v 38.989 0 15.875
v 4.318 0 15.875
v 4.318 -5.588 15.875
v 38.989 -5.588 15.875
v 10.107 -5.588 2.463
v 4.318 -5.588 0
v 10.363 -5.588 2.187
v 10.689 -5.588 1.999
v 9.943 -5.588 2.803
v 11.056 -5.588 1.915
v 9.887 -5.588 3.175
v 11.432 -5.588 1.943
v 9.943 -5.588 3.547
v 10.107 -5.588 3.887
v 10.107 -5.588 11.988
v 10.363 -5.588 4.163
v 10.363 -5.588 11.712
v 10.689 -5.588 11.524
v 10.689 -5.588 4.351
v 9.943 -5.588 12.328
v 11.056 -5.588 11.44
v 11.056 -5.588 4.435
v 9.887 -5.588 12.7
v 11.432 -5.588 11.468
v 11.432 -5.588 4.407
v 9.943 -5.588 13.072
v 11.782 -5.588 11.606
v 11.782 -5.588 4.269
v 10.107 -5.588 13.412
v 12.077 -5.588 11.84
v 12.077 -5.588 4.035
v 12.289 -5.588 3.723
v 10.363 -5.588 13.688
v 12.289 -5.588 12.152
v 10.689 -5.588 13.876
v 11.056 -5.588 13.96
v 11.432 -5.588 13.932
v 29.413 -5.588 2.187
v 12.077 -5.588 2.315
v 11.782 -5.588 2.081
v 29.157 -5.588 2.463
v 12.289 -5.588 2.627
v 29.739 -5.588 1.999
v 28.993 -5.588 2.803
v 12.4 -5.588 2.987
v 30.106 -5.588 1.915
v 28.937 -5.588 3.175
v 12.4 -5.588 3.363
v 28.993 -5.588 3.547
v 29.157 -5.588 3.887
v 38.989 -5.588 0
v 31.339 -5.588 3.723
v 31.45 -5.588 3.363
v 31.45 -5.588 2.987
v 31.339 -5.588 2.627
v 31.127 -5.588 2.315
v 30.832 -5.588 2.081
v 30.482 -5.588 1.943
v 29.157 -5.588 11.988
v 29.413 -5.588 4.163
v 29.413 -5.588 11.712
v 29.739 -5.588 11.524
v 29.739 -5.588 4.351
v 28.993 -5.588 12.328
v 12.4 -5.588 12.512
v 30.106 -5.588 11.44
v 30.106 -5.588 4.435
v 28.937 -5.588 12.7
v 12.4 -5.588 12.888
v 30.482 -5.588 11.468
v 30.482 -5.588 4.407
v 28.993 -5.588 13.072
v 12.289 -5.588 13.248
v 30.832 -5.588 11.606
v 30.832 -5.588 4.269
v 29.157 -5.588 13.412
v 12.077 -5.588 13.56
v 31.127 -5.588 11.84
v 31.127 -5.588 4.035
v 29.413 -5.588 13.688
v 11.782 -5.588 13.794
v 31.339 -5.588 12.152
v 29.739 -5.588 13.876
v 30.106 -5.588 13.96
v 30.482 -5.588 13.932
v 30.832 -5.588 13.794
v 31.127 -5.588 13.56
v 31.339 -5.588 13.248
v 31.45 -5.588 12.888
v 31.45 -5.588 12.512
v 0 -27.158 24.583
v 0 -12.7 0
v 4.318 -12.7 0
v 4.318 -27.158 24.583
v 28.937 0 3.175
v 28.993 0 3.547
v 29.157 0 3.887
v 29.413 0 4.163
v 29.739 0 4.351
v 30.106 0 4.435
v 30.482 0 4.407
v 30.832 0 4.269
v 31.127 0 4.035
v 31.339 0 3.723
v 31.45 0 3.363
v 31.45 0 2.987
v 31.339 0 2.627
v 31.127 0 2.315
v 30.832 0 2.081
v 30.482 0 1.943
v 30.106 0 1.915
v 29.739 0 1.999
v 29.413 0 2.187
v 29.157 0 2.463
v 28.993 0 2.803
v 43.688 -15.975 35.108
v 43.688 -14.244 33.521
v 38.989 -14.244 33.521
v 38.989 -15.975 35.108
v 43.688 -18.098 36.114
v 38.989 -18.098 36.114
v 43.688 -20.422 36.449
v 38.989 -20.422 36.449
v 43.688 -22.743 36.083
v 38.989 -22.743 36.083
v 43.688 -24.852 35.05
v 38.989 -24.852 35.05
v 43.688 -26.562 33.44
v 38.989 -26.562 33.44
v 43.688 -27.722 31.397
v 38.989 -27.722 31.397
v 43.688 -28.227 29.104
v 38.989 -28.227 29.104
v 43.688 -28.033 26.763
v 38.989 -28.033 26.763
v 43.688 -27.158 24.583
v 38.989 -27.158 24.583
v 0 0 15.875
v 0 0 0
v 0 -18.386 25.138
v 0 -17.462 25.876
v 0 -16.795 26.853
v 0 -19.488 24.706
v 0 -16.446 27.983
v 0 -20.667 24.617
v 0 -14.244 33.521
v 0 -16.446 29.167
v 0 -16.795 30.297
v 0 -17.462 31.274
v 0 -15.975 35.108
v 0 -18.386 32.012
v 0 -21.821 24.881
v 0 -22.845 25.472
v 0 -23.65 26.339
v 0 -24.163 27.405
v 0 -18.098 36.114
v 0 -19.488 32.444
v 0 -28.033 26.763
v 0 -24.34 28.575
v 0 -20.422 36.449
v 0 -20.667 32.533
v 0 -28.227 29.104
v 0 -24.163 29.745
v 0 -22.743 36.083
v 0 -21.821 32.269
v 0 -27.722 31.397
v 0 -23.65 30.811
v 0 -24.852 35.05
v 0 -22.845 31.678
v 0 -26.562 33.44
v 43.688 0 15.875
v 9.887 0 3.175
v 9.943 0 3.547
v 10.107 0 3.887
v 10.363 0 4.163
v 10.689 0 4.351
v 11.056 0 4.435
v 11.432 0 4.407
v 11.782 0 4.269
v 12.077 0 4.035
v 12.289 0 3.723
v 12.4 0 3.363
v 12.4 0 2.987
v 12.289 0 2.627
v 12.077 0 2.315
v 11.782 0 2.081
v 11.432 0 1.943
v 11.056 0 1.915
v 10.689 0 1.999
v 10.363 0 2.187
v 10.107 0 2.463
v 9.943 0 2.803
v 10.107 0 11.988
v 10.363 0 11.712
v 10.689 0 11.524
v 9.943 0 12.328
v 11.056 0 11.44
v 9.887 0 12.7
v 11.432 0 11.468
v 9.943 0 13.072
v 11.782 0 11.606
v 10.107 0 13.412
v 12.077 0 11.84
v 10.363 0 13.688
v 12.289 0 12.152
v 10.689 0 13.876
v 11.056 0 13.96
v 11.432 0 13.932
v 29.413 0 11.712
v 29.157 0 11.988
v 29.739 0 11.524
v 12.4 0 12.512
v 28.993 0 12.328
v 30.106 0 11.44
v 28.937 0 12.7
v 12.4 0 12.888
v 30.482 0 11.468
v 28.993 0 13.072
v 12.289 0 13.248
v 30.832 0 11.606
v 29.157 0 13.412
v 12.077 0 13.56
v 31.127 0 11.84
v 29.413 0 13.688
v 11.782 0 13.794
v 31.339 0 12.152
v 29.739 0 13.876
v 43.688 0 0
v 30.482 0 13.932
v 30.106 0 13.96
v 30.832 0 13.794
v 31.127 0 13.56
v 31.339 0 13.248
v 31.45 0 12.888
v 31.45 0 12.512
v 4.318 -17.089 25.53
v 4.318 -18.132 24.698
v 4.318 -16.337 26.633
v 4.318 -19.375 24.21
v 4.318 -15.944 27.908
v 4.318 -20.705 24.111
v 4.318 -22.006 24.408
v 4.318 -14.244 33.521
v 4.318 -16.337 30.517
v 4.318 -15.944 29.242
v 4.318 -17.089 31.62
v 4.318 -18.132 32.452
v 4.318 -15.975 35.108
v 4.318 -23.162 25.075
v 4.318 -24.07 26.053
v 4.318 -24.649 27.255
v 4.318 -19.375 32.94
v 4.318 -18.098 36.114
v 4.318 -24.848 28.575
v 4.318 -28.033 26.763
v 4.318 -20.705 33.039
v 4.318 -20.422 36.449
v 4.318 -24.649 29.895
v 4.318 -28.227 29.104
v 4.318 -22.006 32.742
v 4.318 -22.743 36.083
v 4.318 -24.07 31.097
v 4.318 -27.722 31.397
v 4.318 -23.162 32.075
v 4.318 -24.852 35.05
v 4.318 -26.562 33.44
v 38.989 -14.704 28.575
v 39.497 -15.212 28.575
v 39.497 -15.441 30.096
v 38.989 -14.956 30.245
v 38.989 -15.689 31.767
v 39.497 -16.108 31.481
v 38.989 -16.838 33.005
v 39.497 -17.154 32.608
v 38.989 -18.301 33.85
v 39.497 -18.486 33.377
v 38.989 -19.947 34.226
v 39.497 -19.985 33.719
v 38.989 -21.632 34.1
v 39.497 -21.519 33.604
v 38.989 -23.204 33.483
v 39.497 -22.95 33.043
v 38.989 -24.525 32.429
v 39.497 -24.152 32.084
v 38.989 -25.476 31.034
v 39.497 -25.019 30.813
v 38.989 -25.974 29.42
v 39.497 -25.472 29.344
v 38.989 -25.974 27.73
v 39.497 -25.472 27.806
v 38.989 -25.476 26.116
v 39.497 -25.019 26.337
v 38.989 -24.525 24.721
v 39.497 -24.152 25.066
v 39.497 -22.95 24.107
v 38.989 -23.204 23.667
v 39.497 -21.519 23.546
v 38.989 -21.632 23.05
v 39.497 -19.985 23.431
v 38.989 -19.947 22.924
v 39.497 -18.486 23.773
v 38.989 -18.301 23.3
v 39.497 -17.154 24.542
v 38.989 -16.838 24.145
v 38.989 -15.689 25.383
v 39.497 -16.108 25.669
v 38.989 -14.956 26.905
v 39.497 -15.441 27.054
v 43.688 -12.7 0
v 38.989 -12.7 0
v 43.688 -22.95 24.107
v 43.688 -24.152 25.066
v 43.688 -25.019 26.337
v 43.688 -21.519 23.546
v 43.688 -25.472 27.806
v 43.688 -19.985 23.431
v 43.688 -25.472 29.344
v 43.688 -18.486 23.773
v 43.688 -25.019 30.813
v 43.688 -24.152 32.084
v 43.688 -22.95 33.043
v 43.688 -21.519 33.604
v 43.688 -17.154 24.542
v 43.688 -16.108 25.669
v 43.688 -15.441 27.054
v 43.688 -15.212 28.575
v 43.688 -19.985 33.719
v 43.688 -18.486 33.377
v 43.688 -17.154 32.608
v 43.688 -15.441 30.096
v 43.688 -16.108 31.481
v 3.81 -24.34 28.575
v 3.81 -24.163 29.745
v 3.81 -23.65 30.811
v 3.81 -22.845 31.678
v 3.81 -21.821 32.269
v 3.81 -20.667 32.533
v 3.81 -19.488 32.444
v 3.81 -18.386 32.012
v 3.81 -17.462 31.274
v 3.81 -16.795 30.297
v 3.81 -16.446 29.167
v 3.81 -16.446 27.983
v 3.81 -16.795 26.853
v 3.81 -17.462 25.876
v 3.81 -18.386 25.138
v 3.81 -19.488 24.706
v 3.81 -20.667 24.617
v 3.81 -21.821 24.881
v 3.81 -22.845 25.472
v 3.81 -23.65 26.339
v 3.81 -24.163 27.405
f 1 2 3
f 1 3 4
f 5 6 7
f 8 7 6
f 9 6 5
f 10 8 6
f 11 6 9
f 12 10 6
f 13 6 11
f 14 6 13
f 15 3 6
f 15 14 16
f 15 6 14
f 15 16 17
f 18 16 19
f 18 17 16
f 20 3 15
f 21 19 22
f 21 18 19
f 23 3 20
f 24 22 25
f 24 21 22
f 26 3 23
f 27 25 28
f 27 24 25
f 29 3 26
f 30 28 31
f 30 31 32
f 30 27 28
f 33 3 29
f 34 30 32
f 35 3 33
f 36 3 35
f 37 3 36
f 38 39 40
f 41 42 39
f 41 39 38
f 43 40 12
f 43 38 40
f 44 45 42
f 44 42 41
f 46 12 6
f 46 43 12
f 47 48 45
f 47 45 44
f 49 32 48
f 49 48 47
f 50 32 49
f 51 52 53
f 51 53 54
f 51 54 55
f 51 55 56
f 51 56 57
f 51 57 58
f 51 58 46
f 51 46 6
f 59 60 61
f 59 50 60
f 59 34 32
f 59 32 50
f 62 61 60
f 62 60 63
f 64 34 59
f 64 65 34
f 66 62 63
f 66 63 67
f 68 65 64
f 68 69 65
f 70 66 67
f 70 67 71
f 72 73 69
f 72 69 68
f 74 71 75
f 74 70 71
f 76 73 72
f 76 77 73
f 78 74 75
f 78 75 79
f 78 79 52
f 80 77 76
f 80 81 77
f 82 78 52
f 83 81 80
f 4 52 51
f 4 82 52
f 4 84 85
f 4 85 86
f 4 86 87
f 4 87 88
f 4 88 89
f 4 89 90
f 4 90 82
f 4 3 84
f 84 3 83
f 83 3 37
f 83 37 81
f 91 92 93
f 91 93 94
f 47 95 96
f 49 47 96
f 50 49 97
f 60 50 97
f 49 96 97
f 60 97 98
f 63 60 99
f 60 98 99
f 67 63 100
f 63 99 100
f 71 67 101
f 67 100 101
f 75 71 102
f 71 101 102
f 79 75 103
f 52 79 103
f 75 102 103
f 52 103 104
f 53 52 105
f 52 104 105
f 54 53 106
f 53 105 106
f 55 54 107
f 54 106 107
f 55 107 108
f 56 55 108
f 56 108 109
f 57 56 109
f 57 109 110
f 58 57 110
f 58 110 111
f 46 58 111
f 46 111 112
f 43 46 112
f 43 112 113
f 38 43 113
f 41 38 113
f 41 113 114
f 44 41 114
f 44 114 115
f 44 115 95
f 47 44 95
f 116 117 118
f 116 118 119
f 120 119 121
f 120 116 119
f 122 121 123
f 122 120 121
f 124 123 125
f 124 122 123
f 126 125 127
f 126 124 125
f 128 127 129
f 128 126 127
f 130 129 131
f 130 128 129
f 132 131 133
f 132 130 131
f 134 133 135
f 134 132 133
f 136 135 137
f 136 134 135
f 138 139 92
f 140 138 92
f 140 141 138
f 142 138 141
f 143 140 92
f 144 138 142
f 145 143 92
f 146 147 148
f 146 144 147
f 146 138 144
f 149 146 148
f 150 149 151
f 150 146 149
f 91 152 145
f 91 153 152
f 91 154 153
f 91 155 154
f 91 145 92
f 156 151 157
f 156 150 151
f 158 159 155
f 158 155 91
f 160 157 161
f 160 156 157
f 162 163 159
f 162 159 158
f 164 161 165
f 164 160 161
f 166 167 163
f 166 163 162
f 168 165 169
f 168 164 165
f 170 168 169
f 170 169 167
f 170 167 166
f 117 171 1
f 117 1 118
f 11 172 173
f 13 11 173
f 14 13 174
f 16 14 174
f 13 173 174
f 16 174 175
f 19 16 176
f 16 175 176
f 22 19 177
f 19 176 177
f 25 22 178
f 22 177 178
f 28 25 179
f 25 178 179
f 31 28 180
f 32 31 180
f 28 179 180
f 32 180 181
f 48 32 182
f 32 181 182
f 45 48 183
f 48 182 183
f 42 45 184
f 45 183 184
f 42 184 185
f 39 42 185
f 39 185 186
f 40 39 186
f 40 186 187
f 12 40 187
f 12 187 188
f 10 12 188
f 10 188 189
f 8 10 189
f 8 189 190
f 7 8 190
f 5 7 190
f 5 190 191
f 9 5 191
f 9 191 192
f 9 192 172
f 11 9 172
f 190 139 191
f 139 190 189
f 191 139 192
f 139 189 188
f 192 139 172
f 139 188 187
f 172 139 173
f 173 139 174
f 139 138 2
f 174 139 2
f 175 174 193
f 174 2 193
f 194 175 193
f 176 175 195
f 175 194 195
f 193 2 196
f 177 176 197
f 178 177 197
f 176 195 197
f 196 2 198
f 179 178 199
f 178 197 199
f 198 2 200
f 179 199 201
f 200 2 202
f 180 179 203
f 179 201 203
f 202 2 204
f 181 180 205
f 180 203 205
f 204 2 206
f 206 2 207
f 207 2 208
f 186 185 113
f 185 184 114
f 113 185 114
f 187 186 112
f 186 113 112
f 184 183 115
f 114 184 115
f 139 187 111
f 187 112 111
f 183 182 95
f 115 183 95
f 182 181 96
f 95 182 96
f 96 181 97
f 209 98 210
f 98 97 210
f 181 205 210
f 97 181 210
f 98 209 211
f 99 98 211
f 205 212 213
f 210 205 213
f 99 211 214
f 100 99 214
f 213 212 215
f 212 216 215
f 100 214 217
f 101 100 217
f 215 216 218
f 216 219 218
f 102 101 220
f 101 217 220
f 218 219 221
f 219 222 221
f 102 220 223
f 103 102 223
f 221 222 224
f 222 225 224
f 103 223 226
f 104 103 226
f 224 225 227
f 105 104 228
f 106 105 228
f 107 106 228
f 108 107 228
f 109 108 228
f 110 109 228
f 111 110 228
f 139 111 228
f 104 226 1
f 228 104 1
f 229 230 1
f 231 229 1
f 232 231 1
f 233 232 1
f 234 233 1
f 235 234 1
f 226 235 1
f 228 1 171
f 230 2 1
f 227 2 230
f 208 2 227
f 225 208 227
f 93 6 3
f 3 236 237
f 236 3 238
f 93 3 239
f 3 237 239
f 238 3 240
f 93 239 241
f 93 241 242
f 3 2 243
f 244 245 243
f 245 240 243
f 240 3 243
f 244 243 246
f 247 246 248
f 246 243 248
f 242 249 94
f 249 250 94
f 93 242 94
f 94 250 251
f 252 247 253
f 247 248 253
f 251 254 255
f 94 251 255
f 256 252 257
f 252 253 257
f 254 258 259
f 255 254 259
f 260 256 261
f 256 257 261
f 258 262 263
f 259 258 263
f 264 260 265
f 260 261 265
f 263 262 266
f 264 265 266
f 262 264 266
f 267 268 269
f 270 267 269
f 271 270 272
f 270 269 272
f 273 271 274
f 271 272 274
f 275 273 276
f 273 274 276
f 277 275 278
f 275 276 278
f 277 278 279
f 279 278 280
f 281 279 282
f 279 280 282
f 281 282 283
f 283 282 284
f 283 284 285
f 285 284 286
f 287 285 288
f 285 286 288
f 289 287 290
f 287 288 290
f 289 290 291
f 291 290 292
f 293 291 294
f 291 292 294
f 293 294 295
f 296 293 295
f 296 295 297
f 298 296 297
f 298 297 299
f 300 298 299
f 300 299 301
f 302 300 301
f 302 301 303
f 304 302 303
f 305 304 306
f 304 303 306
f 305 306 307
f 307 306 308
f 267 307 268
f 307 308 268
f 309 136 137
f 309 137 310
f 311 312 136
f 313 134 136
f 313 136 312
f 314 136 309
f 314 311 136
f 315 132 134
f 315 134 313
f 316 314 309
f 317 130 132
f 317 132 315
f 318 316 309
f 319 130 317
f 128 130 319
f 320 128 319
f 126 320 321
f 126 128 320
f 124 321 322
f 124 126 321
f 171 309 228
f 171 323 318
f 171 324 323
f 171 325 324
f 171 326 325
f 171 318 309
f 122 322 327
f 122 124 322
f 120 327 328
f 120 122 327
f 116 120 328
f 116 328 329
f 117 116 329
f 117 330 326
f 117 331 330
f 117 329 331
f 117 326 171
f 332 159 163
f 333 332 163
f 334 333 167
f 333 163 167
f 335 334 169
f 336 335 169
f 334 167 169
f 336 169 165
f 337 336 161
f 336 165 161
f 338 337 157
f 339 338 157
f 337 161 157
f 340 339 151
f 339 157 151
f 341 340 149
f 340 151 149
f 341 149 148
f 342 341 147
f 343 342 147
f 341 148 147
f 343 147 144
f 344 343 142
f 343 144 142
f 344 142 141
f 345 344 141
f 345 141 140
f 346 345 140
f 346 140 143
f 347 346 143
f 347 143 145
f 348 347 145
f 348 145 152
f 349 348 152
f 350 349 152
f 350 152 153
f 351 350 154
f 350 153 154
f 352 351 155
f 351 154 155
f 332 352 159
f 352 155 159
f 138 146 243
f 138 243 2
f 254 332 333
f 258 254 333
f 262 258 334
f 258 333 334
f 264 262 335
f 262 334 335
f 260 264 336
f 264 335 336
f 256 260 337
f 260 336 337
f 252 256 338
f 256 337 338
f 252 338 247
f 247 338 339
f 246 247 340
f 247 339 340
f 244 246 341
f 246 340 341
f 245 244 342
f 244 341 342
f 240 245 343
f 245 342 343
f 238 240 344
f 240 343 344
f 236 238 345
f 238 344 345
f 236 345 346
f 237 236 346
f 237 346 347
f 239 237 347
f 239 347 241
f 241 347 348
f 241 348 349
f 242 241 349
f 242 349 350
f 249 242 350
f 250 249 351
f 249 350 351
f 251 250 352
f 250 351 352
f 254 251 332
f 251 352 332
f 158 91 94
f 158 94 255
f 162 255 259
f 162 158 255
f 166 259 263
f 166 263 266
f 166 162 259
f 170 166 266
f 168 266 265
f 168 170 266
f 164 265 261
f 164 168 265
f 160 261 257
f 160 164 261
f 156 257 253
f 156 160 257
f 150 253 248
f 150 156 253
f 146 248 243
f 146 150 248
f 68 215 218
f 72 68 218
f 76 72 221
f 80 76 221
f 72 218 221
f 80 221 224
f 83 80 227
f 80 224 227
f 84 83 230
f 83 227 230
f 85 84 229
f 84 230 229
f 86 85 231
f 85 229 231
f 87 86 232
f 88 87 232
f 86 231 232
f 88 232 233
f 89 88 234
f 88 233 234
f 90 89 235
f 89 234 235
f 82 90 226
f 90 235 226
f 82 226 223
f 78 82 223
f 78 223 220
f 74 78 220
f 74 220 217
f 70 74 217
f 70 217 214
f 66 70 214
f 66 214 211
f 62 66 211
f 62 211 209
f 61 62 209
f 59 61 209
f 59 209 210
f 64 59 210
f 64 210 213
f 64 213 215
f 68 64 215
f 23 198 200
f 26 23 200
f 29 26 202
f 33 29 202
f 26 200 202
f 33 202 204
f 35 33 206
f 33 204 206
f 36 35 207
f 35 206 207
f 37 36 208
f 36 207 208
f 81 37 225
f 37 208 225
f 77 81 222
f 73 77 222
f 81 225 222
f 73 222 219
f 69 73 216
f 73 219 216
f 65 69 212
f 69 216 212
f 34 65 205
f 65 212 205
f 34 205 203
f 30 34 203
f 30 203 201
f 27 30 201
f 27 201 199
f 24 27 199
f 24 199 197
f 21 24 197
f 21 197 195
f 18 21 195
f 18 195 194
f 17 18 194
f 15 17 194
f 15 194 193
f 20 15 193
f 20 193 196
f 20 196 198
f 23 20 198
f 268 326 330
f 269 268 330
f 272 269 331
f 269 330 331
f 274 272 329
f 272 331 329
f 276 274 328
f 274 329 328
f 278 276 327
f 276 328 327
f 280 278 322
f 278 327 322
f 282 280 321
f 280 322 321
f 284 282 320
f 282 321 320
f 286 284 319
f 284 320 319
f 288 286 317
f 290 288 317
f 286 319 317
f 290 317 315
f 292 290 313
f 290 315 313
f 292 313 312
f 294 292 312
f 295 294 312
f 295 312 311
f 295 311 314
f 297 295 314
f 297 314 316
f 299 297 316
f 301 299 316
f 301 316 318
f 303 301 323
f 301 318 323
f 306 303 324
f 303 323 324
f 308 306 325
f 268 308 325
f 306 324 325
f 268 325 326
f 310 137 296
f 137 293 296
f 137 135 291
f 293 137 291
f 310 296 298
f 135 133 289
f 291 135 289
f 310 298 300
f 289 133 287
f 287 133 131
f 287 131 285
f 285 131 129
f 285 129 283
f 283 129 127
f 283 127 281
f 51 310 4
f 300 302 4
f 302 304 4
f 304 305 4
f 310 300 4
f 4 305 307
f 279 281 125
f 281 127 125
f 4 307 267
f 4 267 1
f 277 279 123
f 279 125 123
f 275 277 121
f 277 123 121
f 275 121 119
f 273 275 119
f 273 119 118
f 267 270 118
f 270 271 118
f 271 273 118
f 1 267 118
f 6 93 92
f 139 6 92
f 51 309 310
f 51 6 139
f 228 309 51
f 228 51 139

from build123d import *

# Parameters (mm, degrees)
F0_W     = 43.688
F0_H     = 15.875
F1_DEPTH = 5.588
F2_R     = 5.15874
F3_DEPTH = 4.699
F4_R     = 3.96875
F4_W     = 5.588
F4_H     = 15.875
F5_DEPTH = 4.318
F7_D     = 2.5273
F8_SIZE  = 0.508


with BuildPart() as f1:
    # F0 (on Front) → F1 (new body)
    with BuildSketch(Plane.XZ):
        with Locations((21.844, 7.9375)):
            Rectangle(F0_W, F0_H)
    extrude(amount=F1_DEPTH)

    # F2 (on face) → F3 (join)
    with BuildSketch(Plane.YZ.offset(43.688)):
        with BuildLine():
            Line((-12.7, 0), (-5.588, 0))
            Line((-5.588, 0), (-5.588, 15.875))
            Line((-5.588, 15.875), (0, 15.875))
            Line((0, 15.875), (-14.2438521908, 33.520744286))
            ThreePointArc((-14.2438521908, 33.520744286), (-24.8517052521, 35.0496709663), (-27.1580024701, 24.5832887591))
            Line((-27.1580024701, 24.5832887591), (-12.7, 0))
        make_face()
        with Locations((-20.3708, 28.575)):
            Circle(F2_R, mode=Mode.SUBTRACT)
    extrude(amount=-F3_DEPTH)

    # F4 (on face) → F5 (join)
    with BuildSketch(Plane(origin=(0, 0, 0), x_dir=(0, -1, 0), z_dir=(-1, 0, 0))):
        with BuildLine():
            Line((14.2438521908, 33.520744286), (0, 15.875))
            Line((0, 15.875), (5.588, 15.875))
            Line((5.588, 15.875), (5.588, 0))
            Line((5.588, 0), (12.7, 0))
            Line((12.7, 0), (27.1580024701, 24.5832887591))
            ThreePointArc((27.1580024701, 24.5832887591), (24.8517052521, 35.0496709663), (14.2438521908, 33.520744286))
        make_face()
        with Locations((20.3708, 28.575)):
            Circle(F4_R, mode=Mode.SUBTRACT)
        with Locations((2.794, 7.9375)):
            Rectangle(F4_W, F4_H)
    extrude(amount=-F5_DEPTH)

    # F7 (through all)
    with Locations(Plane.XZ.offset(5.588)):
        with Locations((11.1506, 12.7), (30.2006, 12.7), (30.2006, 3.175), (11.1506, 3.175)):
            Hole(F7_D / 2)

    # F8
    f8_edges = [f1.edges().sort_by_distance(p)[0] for p in [
        (4.318, -16.40205, 28.575),
        (38.989, -25.52954, 28.575),
    ]]
    chamfer(f8_edges, length=F8_SIZE)


solid = f1.part
